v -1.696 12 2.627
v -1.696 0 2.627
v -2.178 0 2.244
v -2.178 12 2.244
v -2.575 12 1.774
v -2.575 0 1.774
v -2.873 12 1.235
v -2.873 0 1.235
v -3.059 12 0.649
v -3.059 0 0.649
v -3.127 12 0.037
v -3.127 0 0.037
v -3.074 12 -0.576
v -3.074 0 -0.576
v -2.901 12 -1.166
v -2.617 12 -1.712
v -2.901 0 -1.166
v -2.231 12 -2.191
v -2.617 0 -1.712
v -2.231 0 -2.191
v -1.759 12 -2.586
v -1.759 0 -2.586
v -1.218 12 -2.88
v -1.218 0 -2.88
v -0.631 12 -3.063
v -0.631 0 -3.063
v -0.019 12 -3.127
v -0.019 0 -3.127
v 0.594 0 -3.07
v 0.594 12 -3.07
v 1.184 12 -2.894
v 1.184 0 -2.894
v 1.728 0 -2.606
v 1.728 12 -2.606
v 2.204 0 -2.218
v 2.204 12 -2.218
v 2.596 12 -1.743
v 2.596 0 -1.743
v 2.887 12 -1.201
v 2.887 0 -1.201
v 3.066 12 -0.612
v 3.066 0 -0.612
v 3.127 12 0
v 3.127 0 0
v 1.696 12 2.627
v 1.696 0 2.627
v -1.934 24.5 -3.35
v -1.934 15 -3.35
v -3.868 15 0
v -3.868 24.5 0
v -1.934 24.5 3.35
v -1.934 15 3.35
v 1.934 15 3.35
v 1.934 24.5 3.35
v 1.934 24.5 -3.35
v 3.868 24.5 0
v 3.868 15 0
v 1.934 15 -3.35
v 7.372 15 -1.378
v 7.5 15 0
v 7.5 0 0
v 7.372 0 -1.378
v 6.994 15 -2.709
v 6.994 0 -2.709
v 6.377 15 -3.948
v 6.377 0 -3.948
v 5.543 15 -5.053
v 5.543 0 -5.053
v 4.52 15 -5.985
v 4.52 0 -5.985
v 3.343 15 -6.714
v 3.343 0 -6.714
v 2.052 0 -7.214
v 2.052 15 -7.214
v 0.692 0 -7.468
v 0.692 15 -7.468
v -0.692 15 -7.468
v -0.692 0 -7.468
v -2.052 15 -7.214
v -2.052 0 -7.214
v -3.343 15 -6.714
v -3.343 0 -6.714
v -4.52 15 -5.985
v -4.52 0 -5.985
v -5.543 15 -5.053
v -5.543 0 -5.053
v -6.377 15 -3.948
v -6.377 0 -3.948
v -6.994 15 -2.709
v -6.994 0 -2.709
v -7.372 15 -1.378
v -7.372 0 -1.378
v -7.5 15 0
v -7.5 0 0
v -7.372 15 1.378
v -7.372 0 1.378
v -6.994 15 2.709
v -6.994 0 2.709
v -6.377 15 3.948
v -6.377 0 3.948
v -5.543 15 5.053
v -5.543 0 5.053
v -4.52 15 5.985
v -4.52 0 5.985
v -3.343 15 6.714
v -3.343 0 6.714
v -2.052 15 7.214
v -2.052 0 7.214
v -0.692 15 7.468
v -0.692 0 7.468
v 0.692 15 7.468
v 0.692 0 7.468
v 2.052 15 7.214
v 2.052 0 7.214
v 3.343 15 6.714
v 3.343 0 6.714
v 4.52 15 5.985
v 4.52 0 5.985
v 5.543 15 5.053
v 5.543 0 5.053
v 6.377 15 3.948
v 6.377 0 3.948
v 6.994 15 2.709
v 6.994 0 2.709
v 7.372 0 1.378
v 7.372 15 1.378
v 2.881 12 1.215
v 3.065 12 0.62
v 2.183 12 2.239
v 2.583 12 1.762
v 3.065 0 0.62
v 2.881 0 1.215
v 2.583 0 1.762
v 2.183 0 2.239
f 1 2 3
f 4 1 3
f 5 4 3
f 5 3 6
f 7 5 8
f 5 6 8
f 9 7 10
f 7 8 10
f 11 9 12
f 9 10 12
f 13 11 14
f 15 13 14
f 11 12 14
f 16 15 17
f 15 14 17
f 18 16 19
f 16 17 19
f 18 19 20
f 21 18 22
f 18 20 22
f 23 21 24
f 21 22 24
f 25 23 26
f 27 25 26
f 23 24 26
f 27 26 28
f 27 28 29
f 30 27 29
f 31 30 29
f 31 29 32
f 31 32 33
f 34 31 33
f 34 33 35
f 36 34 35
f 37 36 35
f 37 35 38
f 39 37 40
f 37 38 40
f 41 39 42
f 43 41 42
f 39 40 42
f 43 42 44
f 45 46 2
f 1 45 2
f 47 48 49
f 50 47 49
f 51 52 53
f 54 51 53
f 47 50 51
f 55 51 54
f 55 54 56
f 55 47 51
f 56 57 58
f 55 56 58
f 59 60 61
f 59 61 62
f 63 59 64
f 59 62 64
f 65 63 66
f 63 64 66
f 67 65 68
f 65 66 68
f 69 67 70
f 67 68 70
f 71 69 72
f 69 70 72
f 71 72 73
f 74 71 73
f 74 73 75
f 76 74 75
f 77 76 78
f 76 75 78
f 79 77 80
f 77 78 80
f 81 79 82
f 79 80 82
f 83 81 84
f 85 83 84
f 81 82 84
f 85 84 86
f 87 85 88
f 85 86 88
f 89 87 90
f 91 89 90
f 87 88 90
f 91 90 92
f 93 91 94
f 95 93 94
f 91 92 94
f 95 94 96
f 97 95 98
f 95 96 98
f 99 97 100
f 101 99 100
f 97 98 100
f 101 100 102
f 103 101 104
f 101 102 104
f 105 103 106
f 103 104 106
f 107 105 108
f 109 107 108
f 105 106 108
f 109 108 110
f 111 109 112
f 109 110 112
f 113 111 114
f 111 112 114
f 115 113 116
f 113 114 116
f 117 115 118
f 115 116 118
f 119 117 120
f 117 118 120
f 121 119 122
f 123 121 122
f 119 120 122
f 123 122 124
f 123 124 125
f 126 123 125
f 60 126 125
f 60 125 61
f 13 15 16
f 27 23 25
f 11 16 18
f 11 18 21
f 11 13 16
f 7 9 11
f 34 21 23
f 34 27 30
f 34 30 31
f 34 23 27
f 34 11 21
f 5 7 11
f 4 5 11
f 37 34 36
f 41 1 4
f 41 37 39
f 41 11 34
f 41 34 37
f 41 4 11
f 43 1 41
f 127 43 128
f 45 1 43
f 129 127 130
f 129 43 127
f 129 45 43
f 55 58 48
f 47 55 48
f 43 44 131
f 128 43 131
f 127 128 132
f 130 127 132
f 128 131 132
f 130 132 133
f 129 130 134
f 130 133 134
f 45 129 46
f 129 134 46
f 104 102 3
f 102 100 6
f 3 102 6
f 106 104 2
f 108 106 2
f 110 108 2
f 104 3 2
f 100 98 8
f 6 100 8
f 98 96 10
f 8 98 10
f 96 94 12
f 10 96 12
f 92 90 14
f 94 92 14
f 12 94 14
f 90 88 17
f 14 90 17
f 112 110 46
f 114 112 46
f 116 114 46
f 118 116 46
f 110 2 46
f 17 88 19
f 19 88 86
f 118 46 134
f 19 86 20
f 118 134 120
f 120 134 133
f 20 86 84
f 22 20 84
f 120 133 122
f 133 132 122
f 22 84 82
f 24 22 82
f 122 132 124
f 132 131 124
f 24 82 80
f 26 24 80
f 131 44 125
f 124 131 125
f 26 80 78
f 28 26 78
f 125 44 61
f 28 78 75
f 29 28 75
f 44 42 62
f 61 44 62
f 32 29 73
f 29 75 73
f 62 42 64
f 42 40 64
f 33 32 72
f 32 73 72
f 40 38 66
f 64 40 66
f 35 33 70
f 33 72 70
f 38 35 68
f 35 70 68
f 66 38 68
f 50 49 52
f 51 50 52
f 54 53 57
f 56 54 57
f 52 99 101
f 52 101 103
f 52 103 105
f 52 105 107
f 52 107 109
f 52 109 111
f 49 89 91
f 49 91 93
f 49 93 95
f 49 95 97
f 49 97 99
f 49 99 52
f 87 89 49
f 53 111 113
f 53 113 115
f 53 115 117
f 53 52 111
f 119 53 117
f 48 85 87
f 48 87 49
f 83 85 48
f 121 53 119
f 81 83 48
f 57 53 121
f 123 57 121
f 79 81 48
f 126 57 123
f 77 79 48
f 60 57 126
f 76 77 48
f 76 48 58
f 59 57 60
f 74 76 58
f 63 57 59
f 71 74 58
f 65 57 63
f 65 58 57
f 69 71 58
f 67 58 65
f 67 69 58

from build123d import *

# Parameters (mm, degrees)
SKETCH1_R           = 7.5
BOSS_EXTRUDE1_DEPTH = 15
BOSS_EXTRUDE2_DEPTH = 9.5
CUT_EXTRUDE1_DEPTH  = 12


with BuildPart() as part:
    # Sketch1 → Boss-Extrude1 (new body)
    with BuildSketch(Plane(origin=(0, 0, 0), x_dir=(1, 0, 0), z_dir=(0, 1, 0))):
        Circle(SKETCH1_R)
    extrude(amount=BOSS_EXTRUDE1_DEPTH)

    # Sketch4 → Boss-Extrude2 (add)
    with BuildSketch(Plane(origin=(0, 15, 0), x_dir=(1, 0, 0), z_dir=(0, 1, 0))):
        Polygon((1.934123402, 3.35), (-1.934123402, 3.35), (-3.868246804, 0), (-1.934123402, -3.35), (1.934123402, -3.35), (3.868246804, 0), align=None)
    extrude(amount=BOSS_EXTRUDE2_DEPTH)

    # Sketch5 → Cut-Extrude1 (cut)
    with BuildSketch(Plane.XZ):
        with BuildLine():
            Line((1.696172161, 2.627), (-1.696172161, 2.627))
            ThreePointArc((-1.696172161, 2.627), (-1.495693594, -2.74609353), (3.127, 0))
            ThreePointArc((3.127, 0), (2.74609353, 1.495693594), (1.696172161, 2.627))
        make_face()
    extrude(amount=-CUT_EXTRUDE1_DEPTH, mode=Mode.SUBTRACT)


solid = part.part
